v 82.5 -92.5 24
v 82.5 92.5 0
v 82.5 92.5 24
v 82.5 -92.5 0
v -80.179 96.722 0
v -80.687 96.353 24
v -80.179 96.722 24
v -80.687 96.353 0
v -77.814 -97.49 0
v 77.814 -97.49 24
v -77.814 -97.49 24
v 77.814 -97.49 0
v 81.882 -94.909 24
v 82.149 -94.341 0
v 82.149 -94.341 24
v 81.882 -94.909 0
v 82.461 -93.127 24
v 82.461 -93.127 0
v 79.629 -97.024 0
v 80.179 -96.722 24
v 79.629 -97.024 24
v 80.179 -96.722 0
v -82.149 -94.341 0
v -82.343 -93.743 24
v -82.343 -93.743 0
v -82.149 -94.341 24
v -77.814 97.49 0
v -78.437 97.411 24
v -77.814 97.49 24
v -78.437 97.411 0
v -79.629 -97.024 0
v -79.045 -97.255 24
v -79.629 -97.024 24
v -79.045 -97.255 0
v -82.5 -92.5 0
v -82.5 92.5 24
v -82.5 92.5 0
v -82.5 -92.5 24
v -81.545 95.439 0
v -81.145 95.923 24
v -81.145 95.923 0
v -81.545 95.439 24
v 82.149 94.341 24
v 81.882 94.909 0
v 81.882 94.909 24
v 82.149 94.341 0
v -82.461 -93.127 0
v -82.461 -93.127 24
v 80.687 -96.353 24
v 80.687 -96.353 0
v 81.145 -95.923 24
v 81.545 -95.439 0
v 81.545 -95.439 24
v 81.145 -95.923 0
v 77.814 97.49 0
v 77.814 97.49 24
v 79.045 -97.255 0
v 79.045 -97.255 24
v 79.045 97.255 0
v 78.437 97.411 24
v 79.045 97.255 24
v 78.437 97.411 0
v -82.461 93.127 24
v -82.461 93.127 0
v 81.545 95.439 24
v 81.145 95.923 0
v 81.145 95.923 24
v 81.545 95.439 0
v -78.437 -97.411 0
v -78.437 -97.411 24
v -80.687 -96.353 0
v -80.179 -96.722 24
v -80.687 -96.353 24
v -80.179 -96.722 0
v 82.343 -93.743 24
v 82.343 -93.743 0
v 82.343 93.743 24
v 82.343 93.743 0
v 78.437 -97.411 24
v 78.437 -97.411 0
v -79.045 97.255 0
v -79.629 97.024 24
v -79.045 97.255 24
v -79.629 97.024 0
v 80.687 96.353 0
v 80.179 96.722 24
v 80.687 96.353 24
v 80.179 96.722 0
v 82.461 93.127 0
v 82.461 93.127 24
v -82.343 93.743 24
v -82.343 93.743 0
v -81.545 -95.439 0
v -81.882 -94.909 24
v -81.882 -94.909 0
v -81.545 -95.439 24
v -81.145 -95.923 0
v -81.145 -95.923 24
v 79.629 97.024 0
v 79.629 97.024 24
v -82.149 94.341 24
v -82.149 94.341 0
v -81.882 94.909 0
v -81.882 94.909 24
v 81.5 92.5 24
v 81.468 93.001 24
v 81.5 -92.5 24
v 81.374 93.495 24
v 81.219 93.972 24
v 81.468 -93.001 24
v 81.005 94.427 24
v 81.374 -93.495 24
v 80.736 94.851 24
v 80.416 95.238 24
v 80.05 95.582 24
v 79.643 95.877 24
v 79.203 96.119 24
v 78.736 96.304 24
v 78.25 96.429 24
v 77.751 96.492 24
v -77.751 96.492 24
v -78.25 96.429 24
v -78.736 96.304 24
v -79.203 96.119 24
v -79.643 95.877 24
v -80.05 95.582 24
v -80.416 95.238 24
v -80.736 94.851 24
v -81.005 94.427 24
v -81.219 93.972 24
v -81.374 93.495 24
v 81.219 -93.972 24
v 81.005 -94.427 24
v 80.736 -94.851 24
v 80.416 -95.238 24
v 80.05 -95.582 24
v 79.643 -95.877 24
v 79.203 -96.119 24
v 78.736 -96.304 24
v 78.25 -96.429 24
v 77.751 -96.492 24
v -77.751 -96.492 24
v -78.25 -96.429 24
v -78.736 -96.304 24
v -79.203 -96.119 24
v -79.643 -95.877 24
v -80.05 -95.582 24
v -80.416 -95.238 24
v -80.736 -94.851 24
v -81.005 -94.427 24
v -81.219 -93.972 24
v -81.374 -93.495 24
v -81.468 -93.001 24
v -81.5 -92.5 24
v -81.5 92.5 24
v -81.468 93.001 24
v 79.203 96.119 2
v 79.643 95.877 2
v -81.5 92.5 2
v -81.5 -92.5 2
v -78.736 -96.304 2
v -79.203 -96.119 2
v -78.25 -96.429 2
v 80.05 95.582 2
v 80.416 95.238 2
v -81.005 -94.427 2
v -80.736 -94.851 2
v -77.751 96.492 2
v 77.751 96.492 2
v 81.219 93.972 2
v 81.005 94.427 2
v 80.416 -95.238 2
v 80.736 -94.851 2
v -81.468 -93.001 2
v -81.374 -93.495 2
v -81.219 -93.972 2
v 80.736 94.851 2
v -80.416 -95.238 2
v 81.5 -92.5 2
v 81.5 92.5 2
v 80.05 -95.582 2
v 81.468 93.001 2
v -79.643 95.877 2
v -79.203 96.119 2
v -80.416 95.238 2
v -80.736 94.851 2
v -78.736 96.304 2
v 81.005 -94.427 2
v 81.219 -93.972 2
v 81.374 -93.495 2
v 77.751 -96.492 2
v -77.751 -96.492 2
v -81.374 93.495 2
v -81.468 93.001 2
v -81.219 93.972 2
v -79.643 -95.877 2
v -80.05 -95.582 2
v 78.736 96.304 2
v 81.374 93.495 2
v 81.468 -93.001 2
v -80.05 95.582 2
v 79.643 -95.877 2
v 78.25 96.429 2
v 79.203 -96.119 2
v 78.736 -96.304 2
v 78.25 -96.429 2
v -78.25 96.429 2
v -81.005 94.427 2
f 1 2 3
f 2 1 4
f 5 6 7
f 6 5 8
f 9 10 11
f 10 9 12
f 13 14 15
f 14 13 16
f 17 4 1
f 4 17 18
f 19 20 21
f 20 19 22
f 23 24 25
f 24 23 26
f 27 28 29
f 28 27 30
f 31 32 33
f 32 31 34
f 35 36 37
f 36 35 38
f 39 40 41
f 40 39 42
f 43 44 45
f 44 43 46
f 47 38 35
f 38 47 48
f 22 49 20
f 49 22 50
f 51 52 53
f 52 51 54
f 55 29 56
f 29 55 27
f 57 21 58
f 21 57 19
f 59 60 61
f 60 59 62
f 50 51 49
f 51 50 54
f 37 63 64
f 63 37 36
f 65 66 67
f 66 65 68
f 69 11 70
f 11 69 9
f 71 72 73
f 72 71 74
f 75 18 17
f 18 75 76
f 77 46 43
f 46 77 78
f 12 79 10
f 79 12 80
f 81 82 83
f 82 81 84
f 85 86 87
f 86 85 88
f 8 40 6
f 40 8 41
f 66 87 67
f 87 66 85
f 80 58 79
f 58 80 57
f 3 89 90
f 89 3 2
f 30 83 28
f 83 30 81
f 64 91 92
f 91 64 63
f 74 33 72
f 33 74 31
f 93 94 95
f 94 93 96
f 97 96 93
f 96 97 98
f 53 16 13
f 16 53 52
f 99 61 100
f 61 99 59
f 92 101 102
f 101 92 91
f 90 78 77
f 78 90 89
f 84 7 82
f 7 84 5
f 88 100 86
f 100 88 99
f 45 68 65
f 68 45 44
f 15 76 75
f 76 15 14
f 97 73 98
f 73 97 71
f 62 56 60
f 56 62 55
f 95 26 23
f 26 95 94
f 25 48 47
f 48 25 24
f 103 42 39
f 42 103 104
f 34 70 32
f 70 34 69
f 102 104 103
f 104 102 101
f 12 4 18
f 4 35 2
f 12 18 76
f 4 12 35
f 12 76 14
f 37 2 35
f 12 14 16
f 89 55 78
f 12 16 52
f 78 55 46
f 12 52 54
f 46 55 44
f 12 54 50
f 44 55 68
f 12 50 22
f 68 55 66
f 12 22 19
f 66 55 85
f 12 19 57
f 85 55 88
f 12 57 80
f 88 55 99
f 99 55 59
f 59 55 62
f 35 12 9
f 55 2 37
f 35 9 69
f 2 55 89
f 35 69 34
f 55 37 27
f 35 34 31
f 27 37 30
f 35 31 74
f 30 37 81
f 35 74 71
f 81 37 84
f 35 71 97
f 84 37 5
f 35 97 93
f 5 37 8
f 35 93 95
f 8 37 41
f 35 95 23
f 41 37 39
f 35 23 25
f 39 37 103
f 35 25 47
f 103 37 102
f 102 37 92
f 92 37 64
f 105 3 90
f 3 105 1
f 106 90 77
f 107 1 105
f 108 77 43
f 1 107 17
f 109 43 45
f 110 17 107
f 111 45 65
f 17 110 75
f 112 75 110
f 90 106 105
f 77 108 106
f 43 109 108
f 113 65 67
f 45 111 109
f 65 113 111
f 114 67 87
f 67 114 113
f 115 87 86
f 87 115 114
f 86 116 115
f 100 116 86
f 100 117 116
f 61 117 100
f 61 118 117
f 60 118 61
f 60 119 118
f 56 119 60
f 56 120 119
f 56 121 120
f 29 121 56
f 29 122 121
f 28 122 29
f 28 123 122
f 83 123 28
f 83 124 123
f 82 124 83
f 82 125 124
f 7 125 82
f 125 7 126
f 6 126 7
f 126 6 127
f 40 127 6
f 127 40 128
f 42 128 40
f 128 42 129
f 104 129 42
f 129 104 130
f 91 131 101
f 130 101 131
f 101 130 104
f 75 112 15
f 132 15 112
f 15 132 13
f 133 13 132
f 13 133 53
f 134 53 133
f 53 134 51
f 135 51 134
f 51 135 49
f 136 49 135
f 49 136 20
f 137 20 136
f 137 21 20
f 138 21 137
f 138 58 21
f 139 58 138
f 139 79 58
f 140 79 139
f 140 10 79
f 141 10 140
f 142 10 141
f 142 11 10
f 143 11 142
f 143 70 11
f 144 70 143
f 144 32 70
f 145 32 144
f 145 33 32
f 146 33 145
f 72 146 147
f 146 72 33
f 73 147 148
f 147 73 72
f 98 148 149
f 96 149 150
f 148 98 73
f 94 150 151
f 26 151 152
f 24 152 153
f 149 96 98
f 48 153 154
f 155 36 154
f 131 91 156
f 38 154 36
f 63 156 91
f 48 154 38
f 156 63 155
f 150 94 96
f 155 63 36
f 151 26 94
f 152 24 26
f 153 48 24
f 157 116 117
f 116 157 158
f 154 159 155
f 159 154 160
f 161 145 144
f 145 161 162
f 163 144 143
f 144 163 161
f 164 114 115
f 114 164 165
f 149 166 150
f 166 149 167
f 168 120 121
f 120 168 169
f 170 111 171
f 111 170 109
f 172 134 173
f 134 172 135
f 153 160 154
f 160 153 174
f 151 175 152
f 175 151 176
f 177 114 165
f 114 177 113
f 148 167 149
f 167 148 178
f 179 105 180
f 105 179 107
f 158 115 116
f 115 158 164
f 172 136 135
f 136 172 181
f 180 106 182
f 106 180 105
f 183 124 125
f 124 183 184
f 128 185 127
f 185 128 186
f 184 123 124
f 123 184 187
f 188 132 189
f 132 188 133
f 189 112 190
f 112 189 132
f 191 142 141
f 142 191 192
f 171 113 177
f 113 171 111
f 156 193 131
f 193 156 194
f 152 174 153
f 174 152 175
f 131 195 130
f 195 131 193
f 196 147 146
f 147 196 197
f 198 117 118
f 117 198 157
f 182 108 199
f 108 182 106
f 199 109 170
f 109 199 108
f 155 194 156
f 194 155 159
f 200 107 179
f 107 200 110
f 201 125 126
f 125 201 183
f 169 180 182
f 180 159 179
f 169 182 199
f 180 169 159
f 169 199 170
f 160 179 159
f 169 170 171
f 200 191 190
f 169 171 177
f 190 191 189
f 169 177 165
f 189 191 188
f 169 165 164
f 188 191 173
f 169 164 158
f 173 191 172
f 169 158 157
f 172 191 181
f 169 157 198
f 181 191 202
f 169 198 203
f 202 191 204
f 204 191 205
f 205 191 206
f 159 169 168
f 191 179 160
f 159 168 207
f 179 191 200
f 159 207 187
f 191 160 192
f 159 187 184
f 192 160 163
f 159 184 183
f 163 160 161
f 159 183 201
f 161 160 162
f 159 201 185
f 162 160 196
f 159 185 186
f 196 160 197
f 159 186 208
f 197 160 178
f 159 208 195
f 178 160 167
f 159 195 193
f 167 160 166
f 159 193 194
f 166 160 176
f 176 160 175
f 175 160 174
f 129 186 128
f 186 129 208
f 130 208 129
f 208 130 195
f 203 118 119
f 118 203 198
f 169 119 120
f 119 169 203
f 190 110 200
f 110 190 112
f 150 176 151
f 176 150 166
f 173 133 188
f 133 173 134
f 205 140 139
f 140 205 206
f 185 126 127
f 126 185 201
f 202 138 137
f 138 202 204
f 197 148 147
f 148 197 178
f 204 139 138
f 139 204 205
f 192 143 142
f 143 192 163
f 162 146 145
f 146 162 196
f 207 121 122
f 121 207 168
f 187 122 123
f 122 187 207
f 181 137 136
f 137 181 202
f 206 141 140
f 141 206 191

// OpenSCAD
$fn = 50;


difference() {
	union() {
		hull() {
			translate(v = [-77.5000000000, 92.5000000000, 0]) {
				cylinder(h = 24, r = 5);
			}
			translate(v = [77.5000000000, 92.5000000000, 0]) {
				cylinder(h = 24, r = 5);
			}
			translate(v = [-77.5000000000, -92.5000000000, 0]) {
				cylinder(h = 24, r = 5);
			}
			translate(v = [77.5000000000, -92.5000000000, 0]) {
				cylinder(h = 24, r = 5);
			}
		}
	}
	union() {
		translate(v = [0, 0, 2]) {
			hull() {
				translate(v = [-77.5000000000, 92.5000000000, 0]) {
					cylinder(h = 22, r = 4);
				}
				translate(v = [77.5000000000, 92.5000000000, 0]) {
					cylinder(h = 22, r = 4);
				}
				translate(v = [-77.5000000000, -92.5000000000, 0]) {
					cylinder(h = 22, r = 4);
				}
				translate(v = [77.5000000000, -92.5000000000, 0]) {
					cylinder(h = 22, r = 4);
				}
			}
		}
	}
}
